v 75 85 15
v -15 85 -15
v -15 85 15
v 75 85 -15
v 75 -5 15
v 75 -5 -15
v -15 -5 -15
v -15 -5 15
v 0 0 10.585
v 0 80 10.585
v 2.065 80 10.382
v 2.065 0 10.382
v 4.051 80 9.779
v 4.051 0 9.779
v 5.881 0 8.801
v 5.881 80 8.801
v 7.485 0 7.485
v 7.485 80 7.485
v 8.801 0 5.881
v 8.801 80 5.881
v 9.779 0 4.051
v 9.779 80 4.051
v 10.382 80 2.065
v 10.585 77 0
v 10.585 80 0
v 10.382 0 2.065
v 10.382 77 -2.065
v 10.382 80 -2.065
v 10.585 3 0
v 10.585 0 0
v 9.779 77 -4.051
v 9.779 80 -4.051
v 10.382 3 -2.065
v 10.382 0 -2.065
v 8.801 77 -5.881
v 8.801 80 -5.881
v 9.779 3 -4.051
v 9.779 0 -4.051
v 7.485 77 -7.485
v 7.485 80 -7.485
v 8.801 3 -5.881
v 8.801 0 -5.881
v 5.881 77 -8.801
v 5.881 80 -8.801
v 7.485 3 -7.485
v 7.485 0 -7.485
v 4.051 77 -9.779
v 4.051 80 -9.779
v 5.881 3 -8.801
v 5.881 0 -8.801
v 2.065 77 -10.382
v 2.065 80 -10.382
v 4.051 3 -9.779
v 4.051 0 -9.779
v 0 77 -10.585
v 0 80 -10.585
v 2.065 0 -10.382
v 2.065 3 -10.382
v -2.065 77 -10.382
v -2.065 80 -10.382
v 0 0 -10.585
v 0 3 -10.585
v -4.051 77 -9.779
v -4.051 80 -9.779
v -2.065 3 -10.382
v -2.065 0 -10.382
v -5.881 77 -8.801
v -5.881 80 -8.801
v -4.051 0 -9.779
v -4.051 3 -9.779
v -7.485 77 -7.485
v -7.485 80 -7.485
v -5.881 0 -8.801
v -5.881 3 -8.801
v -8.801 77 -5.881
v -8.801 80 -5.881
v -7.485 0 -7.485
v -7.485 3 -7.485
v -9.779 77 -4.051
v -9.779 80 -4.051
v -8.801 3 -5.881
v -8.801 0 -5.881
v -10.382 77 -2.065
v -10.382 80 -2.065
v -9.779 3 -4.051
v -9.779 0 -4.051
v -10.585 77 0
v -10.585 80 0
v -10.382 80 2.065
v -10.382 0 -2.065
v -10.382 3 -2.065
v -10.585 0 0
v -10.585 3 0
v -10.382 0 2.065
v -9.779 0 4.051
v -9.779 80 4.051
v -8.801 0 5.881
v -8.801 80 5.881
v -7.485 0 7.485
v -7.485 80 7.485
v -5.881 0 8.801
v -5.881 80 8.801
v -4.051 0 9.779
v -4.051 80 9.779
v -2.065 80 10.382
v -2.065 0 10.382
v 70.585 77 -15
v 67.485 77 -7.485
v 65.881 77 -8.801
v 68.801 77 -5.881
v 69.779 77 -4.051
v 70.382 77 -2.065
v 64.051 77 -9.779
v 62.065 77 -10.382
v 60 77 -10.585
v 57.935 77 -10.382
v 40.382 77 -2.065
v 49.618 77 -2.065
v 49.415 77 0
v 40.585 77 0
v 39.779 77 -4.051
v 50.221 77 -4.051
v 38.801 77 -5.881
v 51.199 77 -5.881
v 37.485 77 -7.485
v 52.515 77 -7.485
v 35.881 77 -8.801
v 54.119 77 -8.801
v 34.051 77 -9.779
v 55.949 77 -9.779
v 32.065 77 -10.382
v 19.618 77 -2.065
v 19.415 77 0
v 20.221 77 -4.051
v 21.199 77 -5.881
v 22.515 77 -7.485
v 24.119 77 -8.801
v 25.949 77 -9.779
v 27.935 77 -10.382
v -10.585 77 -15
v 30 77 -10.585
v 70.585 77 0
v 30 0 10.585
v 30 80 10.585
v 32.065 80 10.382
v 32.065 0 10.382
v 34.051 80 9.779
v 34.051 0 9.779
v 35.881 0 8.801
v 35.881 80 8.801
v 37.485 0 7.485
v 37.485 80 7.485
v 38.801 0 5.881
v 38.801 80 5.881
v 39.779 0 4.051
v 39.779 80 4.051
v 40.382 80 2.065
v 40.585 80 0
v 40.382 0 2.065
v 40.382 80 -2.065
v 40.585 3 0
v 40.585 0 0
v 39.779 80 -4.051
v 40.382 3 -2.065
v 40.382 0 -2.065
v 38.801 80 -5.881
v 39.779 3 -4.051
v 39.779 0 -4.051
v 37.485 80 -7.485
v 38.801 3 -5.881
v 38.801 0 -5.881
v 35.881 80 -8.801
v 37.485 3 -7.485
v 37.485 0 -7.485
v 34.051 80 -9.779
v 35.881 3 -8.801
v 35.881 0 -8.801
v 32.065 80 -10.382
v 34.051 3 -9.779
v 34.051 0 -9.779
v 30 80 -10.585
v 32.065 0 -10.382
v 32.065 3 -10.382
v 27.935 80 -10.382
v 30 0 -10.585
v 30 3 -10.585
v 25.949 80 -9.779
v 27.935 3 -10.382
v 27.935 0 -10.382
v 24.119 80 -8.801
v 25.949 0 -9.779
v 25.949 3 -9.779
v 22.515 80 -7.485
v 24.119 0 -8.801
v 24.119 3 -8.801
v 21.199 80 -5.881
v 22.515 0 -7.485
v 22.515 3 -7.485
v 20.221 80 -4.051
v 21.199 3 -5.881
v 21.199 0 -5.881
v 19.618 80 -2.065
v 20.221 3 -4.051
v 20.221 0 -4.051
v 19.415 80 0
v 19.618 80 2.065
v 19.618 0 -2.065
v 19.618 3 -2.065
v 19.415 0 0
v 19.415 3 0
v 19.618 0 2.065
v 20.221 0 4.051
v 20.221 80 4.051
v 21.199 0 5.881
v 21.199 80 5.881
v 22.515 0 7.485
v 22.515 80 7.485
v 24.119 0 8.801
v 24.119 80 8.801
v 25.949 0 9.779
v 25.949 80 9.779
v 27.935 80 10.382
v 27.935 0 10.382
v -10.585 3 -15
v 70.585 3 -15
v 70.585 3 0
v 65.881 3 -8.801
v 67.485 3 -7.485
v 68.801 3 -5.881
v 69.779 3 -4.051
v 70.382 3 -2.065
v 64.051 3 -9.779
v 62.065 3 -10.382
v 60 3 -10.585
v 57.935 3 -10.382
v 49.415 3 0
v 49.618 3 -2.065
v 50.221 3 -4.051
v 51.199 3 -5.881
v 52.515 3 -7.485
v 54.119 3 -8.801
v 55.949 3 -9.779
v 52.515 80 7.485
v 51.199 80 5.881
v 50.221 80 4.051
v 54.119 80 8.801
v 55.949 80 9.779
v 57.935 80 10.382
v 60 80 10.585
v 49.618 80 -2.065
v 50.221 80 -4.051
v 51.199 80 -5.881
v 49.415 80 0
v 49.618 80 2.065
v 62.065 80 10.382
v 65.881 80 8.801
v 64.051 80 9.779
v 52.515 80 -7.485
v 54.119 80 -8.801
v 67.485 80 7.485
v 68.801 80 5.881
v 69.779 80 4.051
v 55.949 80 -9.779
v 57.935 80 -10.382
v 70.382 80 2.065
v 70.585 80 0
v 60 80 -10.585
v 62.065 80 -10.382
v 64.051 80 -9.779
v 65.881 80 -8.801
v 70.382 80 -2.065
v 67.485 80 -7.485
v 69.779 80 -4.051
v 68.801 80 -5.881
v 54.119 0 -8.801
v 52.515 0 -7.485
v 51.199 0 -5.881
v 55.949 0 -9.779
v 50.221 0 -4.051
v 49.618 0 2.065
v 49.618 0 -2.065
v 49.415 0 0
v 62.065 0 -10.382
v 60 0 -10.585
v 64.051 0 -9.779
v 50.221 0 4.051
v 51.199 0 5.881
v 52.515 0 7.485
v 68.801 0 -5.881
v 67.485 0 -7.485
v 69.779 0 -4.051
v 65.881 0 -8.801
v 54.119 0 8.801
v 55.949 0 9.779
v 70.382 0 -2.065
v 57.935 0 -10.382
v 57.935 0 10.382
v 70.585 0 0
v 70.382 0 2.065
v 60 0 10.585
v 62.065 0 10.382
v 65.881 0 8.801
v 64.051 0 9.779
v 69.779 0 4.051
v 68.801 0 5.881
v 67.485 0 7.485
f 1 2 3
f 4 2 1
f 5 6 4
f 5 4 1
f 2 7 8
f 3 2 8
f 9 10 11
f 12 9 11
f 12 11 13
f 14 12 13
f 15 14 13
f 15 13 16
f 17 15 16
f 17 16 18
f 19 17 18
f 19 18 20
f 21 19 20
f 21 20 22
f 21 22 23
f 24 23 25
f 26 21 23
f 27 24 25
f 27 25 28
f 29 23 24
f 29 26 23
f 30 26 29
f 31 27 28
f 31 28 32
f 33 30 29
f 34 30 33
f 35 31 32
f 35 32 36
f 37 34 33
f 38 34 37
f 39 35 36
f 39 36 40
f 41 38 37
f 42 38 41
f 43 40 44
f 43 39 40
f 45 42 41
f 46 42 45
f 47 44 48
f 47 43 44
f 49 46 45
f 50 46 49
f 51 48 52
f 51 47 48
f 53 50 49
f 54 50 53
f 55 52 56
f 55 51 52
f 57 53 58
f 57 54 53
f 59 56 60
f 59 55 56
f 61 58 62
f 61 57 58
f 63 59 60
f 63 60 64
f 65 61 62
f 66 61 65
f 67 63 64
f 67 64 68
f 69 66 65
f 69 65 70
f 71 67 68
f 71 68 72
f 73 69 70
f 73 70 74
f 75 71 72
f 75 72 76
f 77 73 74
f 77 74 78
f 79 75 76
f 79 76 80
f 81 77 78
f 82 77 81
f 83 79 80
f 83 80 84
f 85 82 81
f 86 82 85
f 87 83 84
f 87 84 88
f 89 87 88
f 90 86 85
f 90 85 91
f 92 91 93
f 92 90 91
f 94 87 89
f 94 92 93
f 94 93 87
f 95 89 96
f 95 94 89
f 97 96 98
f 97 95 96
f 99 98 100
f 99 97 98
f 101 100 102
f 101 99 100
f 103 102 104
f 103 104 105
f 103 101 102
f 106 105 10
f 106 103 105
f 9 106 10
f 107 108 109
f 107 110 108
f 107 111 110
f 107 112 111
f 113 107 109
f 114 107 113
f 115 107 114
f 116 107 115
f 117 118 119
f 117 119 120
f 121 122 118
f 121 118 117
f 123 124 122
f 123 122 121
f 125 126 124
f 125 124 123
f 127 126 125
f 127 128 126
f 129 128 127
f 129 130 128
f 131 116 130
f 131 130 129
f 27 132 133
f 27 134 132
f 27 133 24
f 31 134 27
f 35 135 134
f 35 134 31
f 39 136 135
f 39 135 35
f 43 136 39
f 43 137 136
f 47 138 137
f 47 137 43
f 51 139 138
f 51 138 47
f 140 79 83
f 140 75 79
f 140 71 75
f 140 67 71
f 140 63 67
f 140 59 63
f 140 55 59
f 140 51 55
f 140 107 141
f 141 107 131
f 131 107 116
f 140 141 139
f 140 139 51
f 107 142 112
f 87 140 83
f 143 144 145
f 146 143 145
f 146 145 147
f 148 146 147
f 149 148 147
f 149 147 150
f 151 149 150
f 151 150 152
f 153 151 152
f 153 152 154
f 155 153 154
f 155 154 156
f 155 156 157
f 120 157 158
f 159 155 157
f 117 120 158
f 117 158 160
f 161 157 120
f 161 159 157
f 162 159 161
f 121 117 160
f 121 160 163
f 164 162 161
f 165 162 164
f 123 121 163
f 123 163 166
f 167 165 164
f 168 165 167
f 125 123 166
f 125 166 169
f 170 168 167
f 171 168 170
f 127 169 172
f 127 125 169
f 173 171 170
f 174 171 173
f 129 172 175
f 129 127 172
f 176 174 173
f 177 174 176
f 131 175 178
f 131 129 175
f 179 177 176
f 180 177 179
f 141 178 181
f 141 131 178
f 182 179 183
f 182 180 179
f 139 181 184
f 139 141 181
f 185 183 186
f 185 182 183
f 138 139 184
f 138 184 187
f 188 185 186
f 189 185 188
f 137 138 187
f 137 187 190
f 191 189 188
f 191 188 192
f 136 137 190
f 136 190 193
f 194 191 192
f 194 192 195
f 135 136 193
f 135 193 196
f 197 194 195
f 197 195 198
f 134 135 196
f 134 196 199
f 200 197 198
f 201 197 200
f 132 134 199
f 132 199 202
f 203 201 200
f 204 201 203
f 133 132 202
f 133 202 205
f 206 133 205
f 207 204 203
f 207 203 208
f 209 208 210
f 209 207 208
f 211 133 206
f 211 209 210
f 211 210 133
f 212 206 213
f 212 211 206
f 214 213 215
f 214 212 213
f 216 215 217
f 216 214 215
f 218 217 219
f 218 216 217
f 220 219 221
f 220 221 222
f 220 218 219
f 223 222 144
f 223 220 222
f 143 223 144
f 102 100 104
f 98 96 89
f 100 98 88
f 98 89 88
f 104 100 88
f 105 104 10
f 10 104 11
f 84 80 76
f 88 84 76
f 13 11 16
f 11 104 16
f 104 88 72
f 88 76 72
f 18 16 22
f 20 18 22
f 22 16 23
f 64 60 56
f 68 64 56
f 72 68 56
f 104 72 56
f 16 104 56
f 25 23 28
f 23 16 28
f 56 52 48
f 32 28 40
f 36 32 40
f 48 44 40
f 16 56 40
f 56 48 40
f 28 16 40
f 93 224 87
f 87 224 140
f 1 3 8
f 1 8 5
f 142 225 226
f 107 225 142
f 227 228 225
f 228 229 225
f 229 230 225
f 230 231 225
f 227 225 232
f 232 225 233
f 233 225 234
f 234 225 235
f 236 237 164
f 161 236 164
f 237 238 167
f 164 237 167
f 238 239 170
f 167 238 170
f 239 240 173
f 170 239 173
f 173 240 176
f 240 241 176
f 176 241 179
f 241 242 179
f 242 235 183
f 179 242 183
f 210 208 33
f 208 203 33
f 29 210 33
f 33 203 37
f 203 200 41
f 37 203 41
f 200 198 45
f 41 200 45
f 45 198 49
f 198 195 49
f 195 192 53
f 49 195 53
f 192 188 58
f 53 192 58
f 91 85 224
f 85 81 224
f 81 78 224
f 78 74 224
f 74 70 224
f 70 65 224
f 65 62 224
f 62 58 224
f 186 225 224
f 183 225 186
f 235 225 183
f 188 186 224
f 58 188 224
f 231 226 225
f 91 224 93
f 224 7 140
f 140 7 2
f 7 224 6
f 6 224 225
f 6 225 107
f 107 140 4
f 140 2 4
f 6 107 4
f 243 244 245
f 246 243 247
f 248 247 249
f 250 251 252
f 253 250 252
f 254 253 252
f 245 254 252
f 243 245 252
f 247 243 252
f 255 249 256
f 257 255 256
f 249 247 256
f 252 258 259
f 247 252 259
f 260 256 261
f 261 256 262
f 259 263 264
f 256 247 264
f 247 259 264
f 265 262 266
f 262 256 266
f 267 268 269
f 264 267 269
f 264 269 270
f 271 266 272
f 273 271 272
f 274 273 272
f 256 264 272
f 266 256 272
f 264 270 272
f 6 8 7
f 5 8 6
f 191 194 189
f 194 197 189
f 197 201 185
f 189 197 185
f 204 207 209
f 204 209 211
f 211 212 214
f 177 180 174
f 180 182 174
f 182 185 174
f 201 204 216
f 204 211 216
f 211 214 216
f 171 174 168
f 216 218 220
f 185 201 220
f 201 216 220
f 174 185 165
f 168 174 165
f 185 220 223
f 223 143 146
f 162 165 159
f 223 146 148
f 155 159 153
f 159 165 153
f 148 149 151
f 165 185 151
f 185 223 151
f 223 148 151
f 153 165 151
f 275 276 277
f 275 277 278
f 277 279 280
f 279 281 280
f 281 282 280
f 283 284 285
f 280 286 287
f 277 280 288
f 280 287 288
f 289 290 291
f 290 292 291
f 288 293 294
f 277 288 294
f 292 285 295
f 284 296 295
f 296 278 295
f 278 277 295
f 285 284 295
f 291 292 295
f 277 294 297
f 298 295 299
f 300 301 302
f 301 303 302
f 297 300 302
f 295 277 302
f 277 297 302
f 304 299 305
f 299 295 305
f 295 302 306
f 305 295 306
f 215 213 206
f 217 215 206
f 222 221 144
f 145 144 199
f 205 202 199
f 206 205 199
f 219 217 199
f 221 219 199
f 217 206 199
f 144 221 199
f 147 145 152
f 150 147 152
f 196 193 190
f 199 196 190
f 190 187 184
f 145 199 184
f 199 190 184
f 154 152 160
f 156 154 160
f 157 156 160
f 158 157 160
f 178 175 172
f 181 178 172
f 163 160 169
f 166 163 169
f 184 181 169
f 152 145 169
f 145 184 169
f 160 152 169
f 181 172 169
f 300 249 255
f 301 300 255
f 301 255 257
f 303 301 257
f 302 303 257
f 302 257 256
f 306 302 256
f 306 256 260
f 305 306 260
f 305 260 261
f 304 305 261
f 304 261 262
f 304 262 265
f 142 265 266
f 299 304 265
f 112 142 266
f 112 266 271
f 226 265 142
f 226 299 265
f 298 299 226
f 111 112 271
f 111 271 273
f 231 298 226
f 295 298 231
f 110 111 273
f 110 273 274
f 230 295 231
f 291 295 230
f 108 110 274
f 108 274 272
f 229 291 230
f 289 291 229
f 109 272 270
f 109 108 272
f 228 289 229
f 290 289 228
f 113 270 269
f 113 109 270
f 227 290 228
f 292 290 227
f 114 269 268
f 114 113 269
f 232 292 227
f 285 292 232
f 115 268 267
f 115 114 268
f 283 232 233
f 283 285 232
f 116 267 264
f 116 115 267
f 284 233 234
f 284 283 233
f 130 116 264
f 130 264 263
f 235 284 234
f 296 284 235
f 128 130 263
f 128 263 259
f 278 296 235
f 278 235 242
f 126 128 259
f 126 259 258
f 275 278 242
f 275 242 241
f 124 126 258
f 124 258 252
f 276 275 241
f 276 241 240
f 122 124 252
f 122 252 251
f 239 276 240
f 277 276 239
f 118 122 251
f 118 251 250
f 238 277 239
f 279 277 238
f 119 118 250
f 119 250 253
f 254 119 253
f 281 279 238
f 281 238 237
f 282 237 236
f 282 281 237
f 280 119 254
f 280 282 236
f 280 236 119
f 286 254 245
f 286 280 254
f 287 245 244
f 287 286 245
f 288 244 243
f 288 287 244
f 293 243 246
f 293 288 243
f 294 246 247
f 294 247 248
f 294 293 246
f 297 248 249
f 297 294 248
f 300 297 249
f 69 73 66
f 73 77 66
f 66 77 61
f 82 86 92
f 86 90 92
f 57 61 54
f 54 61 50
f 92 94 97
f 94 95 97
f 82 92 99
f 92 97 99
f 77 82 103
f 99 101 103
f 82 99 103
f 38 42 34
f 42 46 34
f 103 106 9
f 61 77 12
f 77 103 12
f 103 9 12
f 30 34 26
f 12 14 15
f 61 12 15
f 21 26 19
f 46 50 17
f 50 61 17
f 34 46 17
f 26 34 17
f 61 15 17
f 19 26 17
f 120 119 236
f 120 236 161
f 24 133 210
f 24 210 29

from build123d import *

# Parameters (mm, degrees)
SKETCH1_W           = 90
SKETCH1_H           = 30
SKETCH1_R           = 10.585
BOSS_EXTRUDE1_DEPTH = 80
SKETCH2_W           = 90
SKETCH2_H           = 30
BOSS_EXTRUDE2_DEPTH = 5
SKETCH3_W           = 90
SKETCH3_H           = 30
BOSS_EXTRUDE3_DEPTH = 5
SKETCH4_W           = 81.17
SKETCH4_H           = 74
CUT_EXTRUDE1_DEPTH  = 15


with BuildPart() as part:
    # Sketch1 → Boss-Extrude1 (new body)
    with BuildSketch(Plane(origin=(0, 0, 0), x_dir=(1, 0, 0), z_dir=(0, 1, 0))):
        with Locations((30, 0)):
            Rectangle(SKETCH1_W, SKETCH1_H)
        with Locations(Location((0, 0, 0), (0, 0, 270))):
            Circle(SKETCH1_R, mode=Mode.SUBTRACT)
        with Locations(Location((60, 0, 0), (0, 0, 270))):
            Circle(SKETCH1_R, mode=Mode.SUBTRACT)
        with Locations(Location((30, 0, 0), (0, 0, 270))):
            Circle(SKETCH1_R, mode=Mode.SUBTRACT)
    extrude(amount=BOSS_EXTRUDE1_DEPTH)

    # Sketch2 → Boss-Extrude2 (add)
    with BuildSketch(Plane(origin=(0, 80, 0), x_dir=(1, 0, 0), z_dir=(0, 1, 0))):
        with Locations((30, 0)):
            Rectangle(SKETCH2_W, SKETCH2_H)
    extrude(amount=BOSS_EXTRUDE2_DEPTH)

    # Sketch3 → Boss-Extrude3 (add)
    with BuildSketch(Plane.XZ):
        with Locations((30, 0)):
            Rectangle(SKETCH3_W, SKETCH3_H)
    extrude(amount=BOSS_EXTRUDE3_DEPTH)

    # Sketch4 → Cut-Extrude1 (cut)
    with BuildSketch(Plane(origin=(0, 0, -15), x_dir=(-1, 0, 0), z_dir=(0, 0, -1))):
        with Locations((-30, 40)):
            Rectangle(SKETCH4_W, SKETCH4_H)
    extrude(amount=-CUT_EXTRUDE1_DEPTH, mode=Mode.SUBTRACT)


solid = part.part
